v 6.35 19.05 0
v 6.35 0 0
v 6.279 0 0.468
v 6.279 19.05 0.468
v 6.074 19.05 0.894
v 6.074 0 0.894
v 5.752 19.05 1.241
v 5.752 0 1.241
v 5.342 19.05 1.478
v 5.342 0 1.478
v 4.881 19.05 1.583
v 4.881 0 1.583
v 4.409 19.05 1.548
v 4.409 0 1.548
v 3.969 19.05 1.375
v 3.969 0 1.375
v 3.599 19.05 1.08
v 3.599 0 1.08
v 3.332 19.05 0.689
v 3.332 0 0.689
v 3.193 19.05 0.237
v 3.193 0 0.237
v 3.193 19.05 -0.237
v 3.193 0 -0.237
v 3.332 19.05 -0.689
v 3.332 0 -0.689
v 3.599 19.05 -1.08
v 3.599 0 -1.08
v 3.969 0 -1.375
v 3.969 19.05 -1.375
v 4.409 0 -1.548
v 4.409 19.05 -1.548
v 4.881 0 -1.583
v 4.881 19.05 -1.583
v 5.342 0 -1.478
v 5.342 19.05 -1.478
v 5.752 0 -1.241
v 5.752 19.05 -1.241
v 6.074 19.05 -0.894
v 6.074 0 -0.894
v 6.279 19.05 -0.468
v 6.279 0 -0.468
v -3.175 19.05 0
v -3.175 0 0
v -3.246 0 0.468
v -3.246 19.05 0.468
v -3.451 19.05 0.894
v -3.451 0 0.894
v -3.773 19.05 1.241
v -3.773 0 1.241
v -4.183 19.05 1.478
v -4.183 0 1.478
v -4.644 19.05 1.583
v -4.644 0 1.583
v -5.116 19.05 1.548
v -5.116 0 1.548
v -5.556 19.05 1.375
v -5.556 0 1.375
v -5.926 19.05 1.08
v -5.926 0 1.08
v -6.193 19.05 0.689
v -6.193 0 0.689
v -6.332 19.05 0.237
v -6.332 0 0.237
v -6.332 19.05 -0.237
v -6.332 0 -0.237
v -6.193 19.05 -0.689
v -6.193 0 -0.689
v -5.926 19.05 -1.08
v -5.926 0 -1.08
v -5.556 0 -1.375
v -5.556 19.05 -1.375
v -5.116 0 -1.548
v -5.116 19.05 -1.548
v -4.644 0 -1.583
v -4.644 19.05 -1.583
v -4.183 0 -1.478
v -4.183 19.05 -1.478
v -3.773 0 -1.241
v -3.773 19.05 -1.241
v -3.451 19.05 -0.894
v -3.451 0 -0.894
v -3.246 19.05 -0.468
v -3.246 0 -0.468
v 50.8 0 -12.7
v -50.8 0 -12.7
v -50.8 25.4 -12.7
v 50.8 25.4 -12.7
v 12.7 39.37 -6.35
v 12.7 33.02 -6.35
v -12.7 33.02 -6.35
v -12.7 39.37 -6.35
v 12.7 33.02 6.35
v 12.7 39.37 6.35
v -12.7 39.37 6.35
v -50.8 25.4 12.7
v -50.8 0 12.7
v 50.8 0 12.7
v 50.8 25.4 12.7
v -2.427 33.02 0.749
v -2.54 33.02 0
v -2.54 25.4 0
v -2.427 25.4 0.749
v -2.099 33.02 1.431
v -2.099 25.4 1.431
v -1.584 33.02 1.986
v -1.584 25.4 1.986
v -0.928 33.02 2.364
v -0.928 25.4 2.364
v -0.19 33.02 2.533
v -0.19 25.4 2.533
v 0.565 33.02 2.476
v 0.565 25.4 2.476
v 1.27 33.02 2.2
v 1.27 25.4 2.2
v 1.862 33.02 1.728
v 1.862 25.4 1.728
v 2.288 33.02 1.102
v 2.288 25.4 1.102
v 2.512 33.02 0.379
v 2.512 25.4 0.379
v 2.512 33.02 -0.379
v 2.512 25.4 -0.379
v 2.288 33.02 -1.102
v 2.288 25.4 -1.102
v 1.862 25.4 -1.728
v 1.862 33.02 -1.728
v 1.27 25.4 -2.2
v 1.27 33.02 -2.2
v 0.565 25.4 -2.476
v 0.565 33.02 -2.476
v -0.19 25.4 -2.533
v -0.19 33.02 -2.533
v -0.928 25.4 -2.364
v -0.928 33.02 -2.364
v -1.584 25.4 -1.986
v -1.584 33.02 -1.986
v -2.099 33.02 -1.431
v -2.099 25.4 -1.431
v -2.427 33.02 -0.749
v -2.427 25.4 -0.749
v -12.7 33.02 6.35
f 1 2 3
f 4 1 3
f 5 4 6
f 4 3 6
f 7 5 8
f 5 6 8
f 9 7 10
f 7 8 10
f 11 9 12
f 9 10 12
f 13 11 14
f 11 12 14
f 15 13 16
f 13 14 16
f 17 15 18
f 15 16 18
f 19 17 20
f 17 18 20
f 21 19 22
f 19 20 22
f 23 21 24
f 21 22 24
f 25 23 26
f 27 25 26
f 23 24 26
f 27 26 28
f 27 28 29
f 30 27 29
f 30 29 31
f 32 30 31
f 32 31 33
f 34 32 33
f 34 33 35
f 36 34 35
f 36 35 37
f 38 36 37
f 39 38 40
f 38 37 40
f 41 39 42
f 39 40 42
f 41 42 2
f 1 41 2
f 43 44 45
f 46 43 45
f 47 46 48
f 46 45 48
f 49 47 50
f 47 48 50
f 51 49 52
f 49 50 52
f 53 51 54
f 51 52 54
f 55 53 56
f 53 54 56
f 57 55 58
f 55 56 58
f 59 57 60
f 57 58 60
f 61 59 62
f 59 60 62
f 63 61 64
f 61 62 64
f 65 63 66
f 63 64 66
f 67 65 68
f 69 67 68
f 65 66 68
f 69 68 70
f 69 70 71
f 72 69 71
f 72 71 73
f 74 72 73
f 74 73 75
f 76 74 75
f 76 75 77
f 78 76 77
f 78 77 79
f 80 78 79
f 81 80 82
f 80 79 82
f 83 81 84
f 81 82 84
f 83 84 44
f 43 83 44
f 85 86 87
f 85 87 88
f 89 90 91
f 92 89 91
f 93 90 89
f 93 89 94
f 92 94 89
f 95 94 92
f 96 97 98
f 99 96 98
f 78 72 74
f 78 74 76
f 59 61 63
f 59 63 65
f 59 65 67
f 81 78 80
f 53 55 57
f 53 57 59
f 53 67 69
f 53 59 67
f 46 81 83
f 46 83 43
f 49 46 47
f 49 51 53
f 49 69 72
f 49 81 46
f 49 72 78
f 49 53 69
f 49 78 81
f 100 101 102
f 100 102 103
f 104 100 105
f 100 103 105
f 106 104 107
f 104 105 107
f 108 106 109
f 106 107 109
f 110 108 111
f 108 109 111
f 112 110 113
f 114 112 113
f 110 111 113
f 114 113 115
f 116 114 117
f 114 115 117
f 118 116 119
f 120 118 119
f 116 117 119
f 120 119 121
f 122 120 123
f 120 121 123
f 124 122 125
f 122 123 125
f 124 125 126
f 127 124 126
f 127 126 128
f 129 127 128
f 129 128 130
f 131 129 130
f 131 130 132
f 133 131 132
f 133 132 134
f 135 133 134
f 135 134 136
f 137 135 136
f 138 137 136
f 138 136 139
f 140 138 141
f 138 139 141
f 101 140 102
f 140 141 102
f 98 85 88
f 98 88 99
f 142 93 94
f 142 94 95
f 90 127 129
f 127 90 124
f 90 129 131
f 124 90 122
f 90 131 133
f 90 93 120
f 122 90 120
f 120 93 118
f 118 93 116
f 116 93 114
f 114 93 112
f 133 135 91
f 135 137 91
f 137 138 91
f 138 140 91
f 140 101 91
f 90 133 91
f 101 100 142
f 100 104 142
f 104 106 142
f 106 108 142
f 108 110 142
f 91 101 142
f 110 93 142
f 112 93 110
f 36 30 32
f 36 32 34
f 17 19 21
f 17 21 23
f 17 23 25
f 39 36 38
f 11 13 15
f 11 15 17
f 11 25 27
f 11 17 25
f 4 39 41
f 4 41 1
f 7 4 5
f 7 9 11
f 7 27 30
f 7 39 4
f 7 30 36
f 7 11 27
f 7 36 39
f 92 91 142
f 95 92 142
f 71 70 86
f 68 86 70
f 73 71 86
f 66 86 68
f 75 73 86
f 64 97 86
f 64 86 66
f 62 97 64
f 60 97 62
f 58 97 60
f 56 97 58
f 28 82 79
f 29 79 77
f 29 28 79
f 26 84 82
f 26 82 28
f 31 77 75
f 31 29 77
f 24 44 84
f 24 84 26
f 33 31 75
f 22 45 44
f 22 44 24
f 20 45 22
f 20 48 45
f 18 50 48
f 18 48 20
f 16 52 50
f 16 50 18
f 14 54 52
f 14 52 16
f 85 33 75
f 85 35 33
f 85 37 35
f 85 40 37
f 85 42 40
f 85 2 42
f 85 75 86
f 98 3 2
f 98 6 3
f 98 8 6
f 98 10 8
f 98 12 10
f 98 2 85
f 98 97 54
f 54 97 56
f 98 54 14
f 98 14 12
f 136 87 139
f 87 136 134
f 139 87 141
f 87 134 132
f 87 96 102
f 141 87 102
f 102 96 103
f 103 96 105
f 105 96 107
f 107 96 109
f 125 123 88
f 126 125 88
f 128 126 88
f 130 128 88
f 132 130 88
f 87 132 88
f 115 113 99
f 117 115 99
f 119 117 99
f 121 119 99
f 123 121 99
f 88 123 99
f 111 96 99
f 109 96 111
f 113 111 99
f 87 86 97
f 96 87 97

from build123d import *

# Parameters (mm, degrees)
F0_W     = 101.6
F0_H     = 25.4
F0_R     = 1.5875
F1_DEPTH = 25.4
F2_R     = 2.54
F3_DEPTH = 7.62
F4_W     = 25.4
F4_H     = 12.7
F5_DEPTH = 6.35
F6_DEPTH = 19.05


with BuildPart() as f1:
    # F0 (on Front) → F1 (new body)
    with BuildSketch(Plane.XZ):
        Rectangle(F0_W, F0_H)
        with Locations((-4.7625, 0)):
            Circle(F0_R, mode=Mode.SUBTRACT)
        with Locations((4.7625, 0)):
            Circle(F0_R, mode=Mode.SUBTRACT)
        with Locations((4.7625, 0)):
            Circle(F0_R)
        with Locations((-4.7625, 0)):
            Circle(F0_R)
    extrude(amount=-F1_DEPTH)

    # F2 (on face) → F3 (join)
    with BuildSketch(Plane(origin=(0, 25.4, 0), x_dir=(-1, 0, 0), z_dir=(0, 1, 0))):
        Circle(F2_R)
    extrude(amount=F3_DEPTH)

    # F4 (on face) → F5 (join)
    with BuildSketch(Plane(origin=(0, 33.02, 0), x_dir=(-1, 0, 0), z_dir=(0, 1, 0))):
        Rectangle(F4_W, F4_H)
    extrude(amount=F5_DEPTH)

    # F0 (on Front) → F6 (cut)
    with BuildSketch(Plane.XZ):
        with Locations((-4.7625, 0)):
            Circle(F0_R)
        with Locations((4.7625, 0)):
            Circle(F0_R)
    extrude(amount=-F6_DEPTH, mode=Mode.SUBTRACT)


solid = f1.part
